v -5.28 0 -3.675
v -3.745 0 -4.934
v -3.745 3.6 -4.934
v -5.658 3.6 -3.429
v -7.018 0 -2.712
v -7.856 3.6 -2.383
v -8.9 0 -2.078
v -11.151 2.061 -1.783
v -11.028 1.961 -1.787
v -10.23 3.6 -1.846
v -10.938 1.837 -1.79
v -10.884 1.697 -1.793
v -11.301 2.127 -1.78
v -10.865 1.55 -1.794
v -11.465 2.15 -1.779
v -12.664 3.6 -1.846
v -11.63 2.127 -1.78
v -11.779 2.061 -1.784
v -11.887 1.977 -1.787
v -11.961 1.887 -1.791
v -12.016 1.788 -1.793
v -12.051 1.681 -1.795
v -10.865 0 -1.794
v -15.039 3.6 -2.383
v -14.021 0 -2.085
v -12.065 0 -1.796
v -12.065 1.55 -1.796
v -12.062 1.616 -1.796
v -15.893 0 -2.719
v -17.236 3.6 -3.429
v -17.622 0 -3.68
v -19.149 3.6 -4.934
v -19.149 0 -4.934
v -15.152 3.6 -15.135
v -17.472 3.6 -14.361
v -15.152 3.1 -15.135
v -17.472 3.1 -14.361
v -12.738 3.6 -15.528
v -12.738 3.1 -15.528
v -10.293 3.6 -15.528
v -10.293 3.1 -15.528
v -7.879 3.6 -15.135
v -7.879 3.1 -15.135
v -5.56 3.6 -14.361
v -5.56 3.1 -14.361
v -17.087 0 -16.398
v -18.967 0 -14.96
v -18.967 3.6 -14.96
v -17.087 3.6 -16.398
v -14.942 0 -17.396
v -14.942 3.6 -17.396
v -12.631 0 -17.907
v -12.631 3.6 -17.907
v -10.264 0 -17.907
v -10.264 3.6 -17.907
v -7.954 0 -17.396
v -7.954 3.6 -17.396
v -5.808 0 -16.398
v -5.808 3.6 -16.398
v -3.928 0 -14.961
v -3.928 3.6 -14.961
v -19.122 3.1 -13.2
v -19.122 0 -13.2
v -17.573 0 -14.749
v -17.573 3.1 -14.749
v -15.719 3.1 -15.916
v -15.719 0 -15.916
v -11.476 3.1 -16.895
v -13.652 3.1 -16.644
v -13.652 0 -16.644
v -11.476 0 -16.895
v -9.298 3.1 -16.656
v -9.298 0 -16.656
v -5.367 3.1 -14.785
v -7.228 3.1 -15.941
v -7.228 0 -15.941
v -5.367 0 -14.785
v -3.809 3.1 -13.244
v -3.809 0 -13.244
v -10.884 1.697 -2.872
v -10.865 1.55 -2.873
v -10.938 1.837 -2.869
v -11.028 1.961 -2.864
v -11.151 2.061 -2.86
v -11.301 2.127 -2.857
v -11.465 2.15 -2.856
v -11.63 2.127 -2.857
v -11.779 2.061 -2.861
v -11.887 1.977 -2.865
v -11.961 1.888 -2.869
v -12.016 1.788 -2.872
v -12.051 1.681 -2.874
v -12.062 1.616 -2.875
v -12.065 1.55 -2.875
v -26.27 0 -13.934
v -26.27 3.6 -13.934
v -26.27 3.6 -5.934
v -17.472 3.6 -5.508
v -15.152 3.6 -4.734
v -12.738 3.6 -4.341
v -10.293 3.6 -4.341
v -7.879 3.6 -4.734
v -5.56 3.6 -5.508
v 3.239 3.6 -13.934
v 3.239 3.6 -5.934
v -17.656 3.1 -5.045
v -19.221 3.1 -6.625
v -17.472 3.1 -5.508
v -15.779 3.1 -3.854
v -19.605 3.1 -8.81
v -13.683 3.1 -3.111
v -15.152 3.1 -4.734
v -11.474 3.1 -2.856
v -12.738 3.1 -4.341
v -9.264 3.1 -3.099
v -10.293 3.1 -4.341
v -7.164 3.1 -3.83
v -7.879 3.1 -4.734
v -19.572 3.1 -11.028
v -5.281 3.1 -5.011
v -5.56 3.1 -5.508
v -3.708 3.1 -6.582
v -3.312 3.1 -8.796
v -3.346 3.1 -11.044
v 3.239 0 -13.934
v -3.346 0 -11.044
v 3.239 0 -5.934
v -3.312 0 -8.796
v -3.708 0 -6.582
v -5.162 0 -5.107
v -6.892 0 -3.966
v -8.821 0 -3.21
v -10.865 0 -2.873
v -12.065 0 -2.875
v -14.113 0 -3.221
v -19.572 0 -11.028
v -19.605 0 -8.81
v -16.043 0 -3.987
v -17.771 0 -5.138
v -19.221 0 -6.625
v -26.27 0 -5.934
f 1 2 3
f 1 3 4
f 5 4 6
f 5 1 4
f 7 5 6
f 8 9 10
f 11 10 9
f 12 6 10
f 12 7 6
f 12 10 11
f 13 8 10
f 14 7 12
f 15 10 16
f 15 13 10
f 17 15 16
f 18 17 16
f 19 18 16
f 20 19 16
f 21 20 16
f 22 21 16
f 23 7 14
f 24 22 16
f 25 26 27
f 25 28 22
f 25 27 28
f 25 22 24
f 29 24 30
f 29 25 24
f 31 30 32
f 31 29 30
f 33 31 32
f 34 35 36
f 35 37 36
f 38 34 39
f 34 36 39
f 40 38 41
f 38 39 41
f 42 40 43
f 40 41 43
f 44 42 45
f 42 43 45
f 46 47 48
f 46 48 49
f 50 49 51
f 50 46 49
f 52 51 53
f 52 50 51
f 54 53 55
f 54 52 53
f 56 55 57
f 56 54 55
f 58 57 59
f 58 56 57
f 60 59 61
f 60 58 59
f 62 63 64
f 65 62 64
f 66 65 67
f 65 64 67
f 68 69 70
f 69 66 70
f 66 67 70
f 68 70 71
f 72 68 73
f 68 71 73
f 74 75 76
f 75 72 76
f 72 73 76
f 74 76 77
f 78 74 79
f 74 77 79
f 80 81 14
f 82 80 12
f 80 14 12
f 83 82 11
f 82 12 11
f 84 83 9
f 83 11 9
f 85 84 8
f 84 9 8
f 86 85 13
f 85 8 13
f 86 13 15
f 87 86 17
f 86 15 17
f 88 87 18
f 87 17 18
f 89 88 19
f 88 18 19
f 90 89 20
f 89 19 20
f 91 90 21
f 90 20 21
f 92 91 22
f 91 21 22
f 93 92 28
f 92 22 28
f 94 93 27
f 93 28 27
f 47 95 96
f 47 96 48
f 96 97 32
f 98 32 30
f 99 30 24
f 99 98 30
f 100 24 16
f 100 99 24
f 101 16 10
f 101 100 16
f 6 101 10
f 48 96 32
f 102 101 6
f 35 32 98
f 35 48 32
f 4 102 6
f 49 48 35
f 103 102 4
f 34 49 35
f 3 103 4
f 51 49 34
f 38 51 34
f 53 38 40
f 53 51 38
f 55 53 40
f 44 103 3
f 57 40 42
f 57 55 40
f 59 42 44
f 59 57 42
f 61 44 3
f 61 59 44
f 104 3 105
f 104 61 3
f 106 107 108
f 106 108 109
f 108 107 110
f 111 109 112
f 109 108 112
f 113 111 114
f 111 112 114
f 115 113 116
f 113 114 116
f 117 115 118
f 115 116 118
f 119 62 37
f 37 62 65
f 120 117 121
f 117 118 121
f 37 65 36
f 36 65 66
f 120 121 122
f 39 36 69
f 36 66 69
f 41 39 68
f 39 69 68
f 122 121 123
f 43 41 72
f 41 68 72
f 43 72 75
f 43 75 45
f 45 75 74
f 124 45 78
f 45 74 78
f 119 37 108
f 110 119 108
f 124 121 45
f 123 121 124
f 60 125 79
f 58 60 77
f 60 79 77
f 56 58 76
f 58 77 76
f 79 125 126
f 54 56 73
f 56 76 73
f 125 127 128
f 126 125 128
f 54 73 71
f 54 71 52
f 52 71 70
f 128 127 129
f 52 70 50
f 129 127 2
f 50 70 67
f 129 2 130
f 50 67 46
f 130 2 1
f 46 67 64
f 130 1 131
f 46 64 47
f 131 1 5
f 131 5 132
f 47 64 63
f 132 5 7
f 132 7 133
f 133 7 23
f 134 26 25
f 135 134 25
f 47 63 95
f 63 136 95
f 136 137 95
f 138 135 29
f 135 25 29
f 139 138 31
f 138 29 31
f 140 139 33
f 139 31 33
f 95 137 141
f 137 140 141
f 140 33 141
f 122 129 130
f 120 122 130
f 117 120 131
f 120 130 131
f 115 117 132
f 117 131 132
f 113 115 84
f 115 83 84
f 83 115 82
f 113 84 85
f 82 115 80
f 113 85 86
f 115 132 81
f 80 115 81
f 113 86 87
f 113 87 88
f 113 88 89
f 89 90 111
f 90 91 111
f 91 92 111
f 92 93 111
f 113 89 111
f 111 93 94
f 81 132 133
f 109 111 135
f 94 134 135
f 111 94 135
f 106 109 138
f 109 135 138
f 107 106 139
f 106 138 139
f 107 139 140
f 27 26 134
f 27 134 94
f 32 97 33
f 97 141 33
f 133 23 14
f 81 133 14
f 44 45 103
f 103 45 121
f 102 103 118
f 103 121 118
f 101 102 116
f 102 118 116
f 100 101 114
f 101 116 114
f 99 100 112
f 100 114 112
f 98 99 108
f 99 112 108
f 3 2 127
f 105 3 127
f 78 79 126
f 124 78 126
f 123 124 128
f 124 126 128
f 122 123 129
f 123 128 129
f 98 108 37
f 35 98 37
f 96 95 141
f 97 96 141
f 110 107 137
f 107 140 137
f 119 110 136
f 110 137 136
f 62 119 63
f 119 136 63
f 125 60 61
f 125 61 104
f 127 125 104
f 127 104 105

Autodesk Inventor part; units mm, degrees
ref_plane "Arbeitsebene3" through (-3.4226, 4.8, -13.6708) normal (0.2249, 0.9744, -0.004) x (0.0178, 0, 0.9998)
ref_plane "YZ Plane" through (0, 0, 0) normal (1, 0, 0) x (0, 1, 0)
ref_plane "XZ Plane" through (0, 0, 0) normal (0, 1, 0) x (-1, 0, 0)
sketch "Skizze1" plane through (0, 0, 0) normal (0, 1, 0) x (-1, 0, 0)
  line L0 (0, 0) -> (21.4435, 0) construction
  line L1 (21.4435, 0) -> (21.4435, -17.7713) construction
  line L2 (21.4435, -17.7713) -> (0, -17.7713) construction
  line L3 (0, -17.7713) -> (0, 0) construction
  arc A0 (3.4429, -6.1124) -> (3.5369, -12.2987) centre (13.9264, -9.047) ccw
  arc A1 (3.5369, -12.2987) -> (17.7561, -12.2571) centre (10.6298, -6.5721) ccw
  arc A2 (17.8481, -6.152) -> (3.4429, -6.1124) centre (10.6298, -11.844) ccw
  arc A3 (17.7561, -12.2571) -> (17.8481, -6.152) centre (7.348, -9.047) ccw
  line L4 (3.0399, -9.047) -> (18.2399, -9.047)
  line L5 (10.6298, -2.6515) -> (10.6298, -15.6882)
  dimension "d9" = 15.2
  dimension "d12" = 13.0368
sketch "Skizze2" plane through (0, 0, 0) normal (0, 1, 0) x (-1, 0, 0)
  line L0 (0, 0) -> (21.0912, 0) construction
  line L1 (21.0912, 0) -> (21.0912, -24.0698) construction
  line L2 (21.0912, -24.0698) -> (0, -24.0698) construction
  line L3 (0, -24.0698) -> (0, 0) construction
  line L4 (17.3479, -12.3442) -> (17.5564, -17.8355)
  line L5 (0, -15.4153) -> (21.0912, -15.022)
  point P0 (17.4522, -15.0899)
  point P1 (17.8576, -15.0823)
  point P2 (2.6602, -15.3657)
  point P3 (10.1167, -10.9016)
  point P4 (10.0352, -15.2282)
  point P5 (10.3203, -19.614)
  point P6 (15.9484, -15.1179)
  point P7 (4.4034, -15.3332)
  dimension "d38" = 15.2
  dimension "d47" = 8.7147
sketch "Skizze3" plane through (0, 0, 0) normal (0, 1, 0) x (-1, 0, 0)
  line L0 (0, 0) -> (41.0457, 0) construction
  line L1 (41.0457, 0) -> (41.0457, -50.0176) construction
  line L2 (41.0457, -50.0176) -> (0, -50.0176) construction
  line L3 (0, -50.0176) -> (0, 0) construction
  arc A0 (26.8609, -29.1094) -> (14.9484, -29.1094) centre (20.9046, -43.0907) ccw
  arc A1 (14.9484, -37.9624) -> (26.8609, -37.9624) centre (20.9046, -23.981) ccw
  line L4 (26.8609, -29.1094) -> (26.8609, -37.9624)
  line L5 (14.9484, -37.9624) -> (14.9484, -29.1094)
  point P0 (20.7813, -28.8717)
  point P1 (20.996, -37.5841)
  dimension "d49" = 8.715
  dimension "d57" = 15.1972
  dimension "d58" = 15.1972
  dimension "d59" = 11.9125
  dimension "d67" = 8.853
  dimension "d69" = 0
  dimension "d70" = 8.853
sketch "Skizze4" plane through (0, 0, 0) normal (0, 1, 0) x (-1, 0, 0)
  arc A0 (19.2206, -6.6251) -> (3.7078, -6.5825) centre (11.4473, -12.755) ccw
  arc A1 (19.1216, -13.1996) -> (19.2206, -6.6251) centre (7.9131, -9.7427) ccw
  arc A2 (3.8091, -13.2445) -> (19.1216, -13.1996) centre (11.4473, -7.0776) ccw
  arc A3 (3.7078, -6.5825) -> (3.8091, -13.2445) centre (14.9974, -9.7427) ccw
  arc A4 (20.1996, -6.1308) -> (2.731, -6.0835) centre (11.4473, -12.755) ccw
  arc A5 (20.0894, -13.7103) -> (20.1996, -6.1308) centre (7.9131, -9.7427) ccw
  arc A6 (2.8436, -13.7601) -> (20.0894, -13.7103) centre (11.4473, -7.0776) ccw
  arc A7 (2.731, -6.0835) -> (2.8436, -13.7601) centre (14.9974, -9.7427) ccw
  point P0 (0, 0)
  dimension "d60" = 1.077
extrude "Extrusion1" add sketch "Skizze4" along normal blind 3.1
sketch "Skizze8" plane through (0, 3.1, 0) normal (0, 1, 0) x (1, 0, 0)
  line L0 (-17.4719, 5.508) -> (-17.4719, 14.361)
  arc A0 (-17.4719, 5.508) -> (-5.5595, 5.508) centre (-11.5157, 19.4893) ccw
  arc A1 (-5.5595, 14.361) -> (-17.4719, 14.361) centre (-11.5157, 0.3796) ccw
  line L1 (-5.5595, 14.361) -> (-5.5595, 5.508)
  line L2 (-17.4719, 5.508) -> (-5.5595, 14.361) construction
  line L3 (-17.4719, 14.361) -> (-5.5595, 5.508) construction
  arc A2 (-19.1216, 13.1996) -> (-19.2206, 6.6251) centre (-7.9131, 9.7427) ccw construction
  arc A3 (-3.8091, 13.2445) -> (-19.1216, 13.1996) centre (-11.4473, 7.0776) ccw construction
  arc A4 (-3.7078, 6.5825) -> (-3.8091, 13.2445) centre (-14.9974, 9.7427) ccw construction
  arc A5 (-19.2206, 6.6251) -> (-3.7078, 6.5825) centre (-11.4473, 12.755) ccw construction
  arc A6 (-20.1996, 6.1308) -> (-2.731, 6.0835) centre (-11.4473, 12.755) ccw projected
  arc A7 (-2.731, 6.0835) -> (-2.8436, 13.7601) centre (-14.9974, 9.7427) ccw projected
  arc A8 (-2.8436, 13.7601) -> (-20.0894, 13.7103) centre (-11.4473, 7.0776) ccw projected
  arc A9 (-20.0894, 13.7103) -> (-20.1996, 6.1308) centre (-7.9131, 9.7427) ccw projected
  line L4 (-19.2206, 6.6251) -> (-3.8091, 13.2445) construction
  line L5 (-19.1216, 13.1996) -> (-3.7078, 6.5825) construction
  point P0 (0, 0)
  point P1 (-11.5157, 9.9345)
  point P2 (-11.5157, 9.9345)
extrude "Extrusion3" add sketch "Skizze8" along normal blind 0.5
sketch "Skizze9" plane through (0, 0, 0) normal (0, 0, 1) x (1, 0, 0)
  line L0 (-2.731, 0) -> (-20.1996, 0) construction
  line L1 (-2.731, 0) -> (-2.731, 3.6) construction
  line L2 (-20.1996, 3.6) -> (-2.731, 3.6) construction
  line L3 (-20.1996, 0) -> (-20.1996, 3.6) construction
  line L4 (-3.8091, 0) -> (-19.1216, 0) projected
  line L5 (-11.4653, 0) -> (-12.0653, 0)
  line L6 (-12.0653, 0) -> (-12.0653, 1.55)
  arc A0 (-11.4653, 2.15) -> (-12.0653, 1.55) centre (-11.4653, 1.55) ccw
  line L7 (-11.4653, 1.55) -> (-11.4653, 2.15) construction
  line L8 (-11.4653, 1.55) -> (-12.0653, 1.55) construction
  line L9 (-11.4653, 0) -> (-11.4653, 6.3928) construction
  line L10 (-20.1996, 0) -> (-2.731, 0) construction
  line L11 (-10.8653, 0) -> (-10.8653, 1.55)
  arc A1 (-10.8653, 1.55) -> (-11.4653, 2.15) centre (-11.4653, 1.55) ccw
  line L12 (-11.4653, 0) -> (-10.8653, 0)
  point P0 (0, 0)
  dimension "d75" = 0.6
  dimension "d76" = 90
  dimension "d77" = 1.55
extrude "Extrusion4" cut sketch "Skizze9" against normal up to next
sketch "Skizze10" plane through (0, 0, 0) normal (0, 1, 0) x (-1, 0, 0)
  arc A0 (5.5595, -14.361) -> (17.4719, -14.361) centre (11.5157, -0.3796) ccw projected
  line L0 (5.5595, -14.361) -> (5.5595, -5.508) projected
  arc A1 (17.4719, -5.508) -> (5.5595, -5.508) centre (11.5157, -19.4893) ccw projected
  line L1 (17.4719, -5.508) -> (17.4719, -14.361) projected
  arc A2 (20.1996, -6.1308) -> (2.731, -6.0835) centre (11.4473, -12.755) ccw projected
  arc A3 (2.731, -6.0835) -> (2.8436, -13.7601) centre (14.9974, -9.7427) ccw projected
  arc A4 (2.8436, -13.7601) -> (20.0894, -13.7103) centre (11.4473, -7.0776) ccw projected
  arc A5 (20.0894, -13.7103) -> (20.1996, -6.1308) centre (7.9131, -9.7427) ccw projected
  arc A6 (20.1996, -6.1308) -> (2.731, -6.0835) centre (11.4473, -12.755) ccw projected
  line L2 (5.5595, -14.361) -> (5.5595, -5.508) construction
  line L3 (5.5595, -9.9345) -> (-7.2798, -9.9345) construction
  line L4 (3.7452, -4.9345) -> (-3.2387, -5.9345)
  line L5 (-3.2387, -5.9345) -> (-3.2387, -9.9345)
  line L6 (3.9282, -14.9607) -> (-3.2387, -13.9345)
  line L7 (-3.2387, -13.9345) -> (-3.2387, -9.9345)
  line L8 (17.4719, -5.508) -> (17.4719, -14.361) construction
  line L9 (17.4719, -9.9345) -> (23.9782, -9.9345) construction
  line L10 (22.5662, -4.9345) -> (14.2748, -4.9345) construction
  arc A7 (2.731, -6.0835) -> (2.8436, -13.7601) centre (14.9974, -9.7427) ccw construction
  line L11 (26.2701, -9.9345) -> (26.2701, -5.9345)
  line L12 (26.2701, -5.9345) -> (19.1494, -4.9345)
  line L13 (26.2701, -9.9345) -> (26.2701, -13.9345)
  line L14 (26.2701, -13.9345) -> (18.967, -14.9601)
  point P0 (0, 0)
  point P1 (3.7452, -14.9345)
  point P2 (2.1983, -9.9345)
  point P3 (2.1983, -9.9345)
  point P4 (19.1494, -14.9345)
  dimension "d80" = 5
  dimension "d81" = 5
  dimension "d82" = 8.7982
  dimension "d83" = 8.7982
  dimension "d84" = 4
  dimension "d85" = 4
extrude "Extrusion5" add sketch "Skizze10" along normal up to surface (3.6 mm away) contours A2 L12 L11 L13 L14 A4 A5 | A2 A3 A4 L6 L7 L5 L4
sketch "Skizze13" plane through (0, 0, 0) normal (0, -1, 0) x (1, 0, 0)
  line L0 (-3.7452, -4.9345) -> (3.2387, -5.9345) projected
  line L1 (3.2387, -13.9345) -> (-3.9282, -14.9607) projected
  arc A0 (-3.8091, -13.2445) -> (-3.7078, -6.5825) centre (-14.9974, -9.7427) ccw projected
  arc A1 (-3.3813, -14.9345) -> (-2.5876, -6.9345) centre (-14.9974, -9.7427) ccw
  line L2 (3.2387, -5.9345) -> (3.2387, -13.9345) projected
  line L3 (3.2387, -6.9345) -> (-2.5876, -6.9345)
  line L4 (3.2387, -14.9345) -> (-3.3813, -14.9345)
  point P0 (0, 0)
  dimension "d92" = 1
  dimension "d104" = 1
  dimension "d105" = 1
sketch "Skizze12" plane through (0, 0, 0) normal (0, -1, 0) x (1, 0, 0)
  arc A0 (-3.5369, -12.2987) -> (-3.4429, -6.1124) centre (-13.9264, -9.047) ccw projected
  arc A1 (-17.7561, -12.2571) -> (-3.5369, -12.2987) centre (-10.6298, -6.5721) ccw projected
  arc A2 (-17.8481, -6.152) -> (-17.7561, -12.2571) centre (-7.348, -9.047) ccw projected
  arc A3 (-11.2465, -2.6722) -> (-17.8481, -6.152) centre (-10.6298, -11.844) ccw projected
  line L0 (-11.2465, -2.6722) -> (-11.2465, -1.6701) projected
  arc A4 (-11.2465, -1.6701) -> (-17.9952, -4.7985) centre (-10.6298, -11.844) ccw projected
  line L1 (-25.4478, -5.693) -> (-17.9952, -4.7985) projected
  line L2 (-25.4478, -12.757) -> (-25.4478, -5.693) projected
  line L3 (-17.8374, -13.6705) -> (-25.4478, -12.757) projected
  arc A5 (-17.8374, -13.6705) -> (-3.4226, -13.6708) centre (-10.6298, -6.5721) ccw projected
  line L4 (-17.9952, -4.7985) -> (-17.963, -6.6068)
  line L5 (-17.8695, -11.8632) -> (-17.8374, -13.6705)
  arc A6 (-2.3529, -11.757) -> (-2.2753, -6.693) centre (-13.9264, -9.047) ccw projected
  line L6 (4.0611, -5.693) -> (4.0611, -6.693) projected
  line L7 (-3.2644, -4.7985) -> (4.0611, -5.693) projected
  arc A7 (-3.2644, -4.7985) -> (-10.0465, -1.6682) centre (-10.6298, -11.844) ccw projected
  line L8 (-10.0465, -1.6682) -> (-10.0465, -2.67) projected
  arc A8 (-3.4429, -6.1124) -> (-10.0465, -2.67) centre (-10.6298, -11.844) ccw projected
  line L9 (4.0611, -12.757) -> (-3.4226, -13.6708) projected
  line L10 (4.0611, -11.757) -> (4.0611, -12.757) projected
  line L11 (4.0611, -11.757) -> (-2.3529, -11.757) projected
  line L12 (-2.2753, -6.693) -> (4.0611, -6.693) projected
  point P0 (0, 0)
properties part number "Main"
